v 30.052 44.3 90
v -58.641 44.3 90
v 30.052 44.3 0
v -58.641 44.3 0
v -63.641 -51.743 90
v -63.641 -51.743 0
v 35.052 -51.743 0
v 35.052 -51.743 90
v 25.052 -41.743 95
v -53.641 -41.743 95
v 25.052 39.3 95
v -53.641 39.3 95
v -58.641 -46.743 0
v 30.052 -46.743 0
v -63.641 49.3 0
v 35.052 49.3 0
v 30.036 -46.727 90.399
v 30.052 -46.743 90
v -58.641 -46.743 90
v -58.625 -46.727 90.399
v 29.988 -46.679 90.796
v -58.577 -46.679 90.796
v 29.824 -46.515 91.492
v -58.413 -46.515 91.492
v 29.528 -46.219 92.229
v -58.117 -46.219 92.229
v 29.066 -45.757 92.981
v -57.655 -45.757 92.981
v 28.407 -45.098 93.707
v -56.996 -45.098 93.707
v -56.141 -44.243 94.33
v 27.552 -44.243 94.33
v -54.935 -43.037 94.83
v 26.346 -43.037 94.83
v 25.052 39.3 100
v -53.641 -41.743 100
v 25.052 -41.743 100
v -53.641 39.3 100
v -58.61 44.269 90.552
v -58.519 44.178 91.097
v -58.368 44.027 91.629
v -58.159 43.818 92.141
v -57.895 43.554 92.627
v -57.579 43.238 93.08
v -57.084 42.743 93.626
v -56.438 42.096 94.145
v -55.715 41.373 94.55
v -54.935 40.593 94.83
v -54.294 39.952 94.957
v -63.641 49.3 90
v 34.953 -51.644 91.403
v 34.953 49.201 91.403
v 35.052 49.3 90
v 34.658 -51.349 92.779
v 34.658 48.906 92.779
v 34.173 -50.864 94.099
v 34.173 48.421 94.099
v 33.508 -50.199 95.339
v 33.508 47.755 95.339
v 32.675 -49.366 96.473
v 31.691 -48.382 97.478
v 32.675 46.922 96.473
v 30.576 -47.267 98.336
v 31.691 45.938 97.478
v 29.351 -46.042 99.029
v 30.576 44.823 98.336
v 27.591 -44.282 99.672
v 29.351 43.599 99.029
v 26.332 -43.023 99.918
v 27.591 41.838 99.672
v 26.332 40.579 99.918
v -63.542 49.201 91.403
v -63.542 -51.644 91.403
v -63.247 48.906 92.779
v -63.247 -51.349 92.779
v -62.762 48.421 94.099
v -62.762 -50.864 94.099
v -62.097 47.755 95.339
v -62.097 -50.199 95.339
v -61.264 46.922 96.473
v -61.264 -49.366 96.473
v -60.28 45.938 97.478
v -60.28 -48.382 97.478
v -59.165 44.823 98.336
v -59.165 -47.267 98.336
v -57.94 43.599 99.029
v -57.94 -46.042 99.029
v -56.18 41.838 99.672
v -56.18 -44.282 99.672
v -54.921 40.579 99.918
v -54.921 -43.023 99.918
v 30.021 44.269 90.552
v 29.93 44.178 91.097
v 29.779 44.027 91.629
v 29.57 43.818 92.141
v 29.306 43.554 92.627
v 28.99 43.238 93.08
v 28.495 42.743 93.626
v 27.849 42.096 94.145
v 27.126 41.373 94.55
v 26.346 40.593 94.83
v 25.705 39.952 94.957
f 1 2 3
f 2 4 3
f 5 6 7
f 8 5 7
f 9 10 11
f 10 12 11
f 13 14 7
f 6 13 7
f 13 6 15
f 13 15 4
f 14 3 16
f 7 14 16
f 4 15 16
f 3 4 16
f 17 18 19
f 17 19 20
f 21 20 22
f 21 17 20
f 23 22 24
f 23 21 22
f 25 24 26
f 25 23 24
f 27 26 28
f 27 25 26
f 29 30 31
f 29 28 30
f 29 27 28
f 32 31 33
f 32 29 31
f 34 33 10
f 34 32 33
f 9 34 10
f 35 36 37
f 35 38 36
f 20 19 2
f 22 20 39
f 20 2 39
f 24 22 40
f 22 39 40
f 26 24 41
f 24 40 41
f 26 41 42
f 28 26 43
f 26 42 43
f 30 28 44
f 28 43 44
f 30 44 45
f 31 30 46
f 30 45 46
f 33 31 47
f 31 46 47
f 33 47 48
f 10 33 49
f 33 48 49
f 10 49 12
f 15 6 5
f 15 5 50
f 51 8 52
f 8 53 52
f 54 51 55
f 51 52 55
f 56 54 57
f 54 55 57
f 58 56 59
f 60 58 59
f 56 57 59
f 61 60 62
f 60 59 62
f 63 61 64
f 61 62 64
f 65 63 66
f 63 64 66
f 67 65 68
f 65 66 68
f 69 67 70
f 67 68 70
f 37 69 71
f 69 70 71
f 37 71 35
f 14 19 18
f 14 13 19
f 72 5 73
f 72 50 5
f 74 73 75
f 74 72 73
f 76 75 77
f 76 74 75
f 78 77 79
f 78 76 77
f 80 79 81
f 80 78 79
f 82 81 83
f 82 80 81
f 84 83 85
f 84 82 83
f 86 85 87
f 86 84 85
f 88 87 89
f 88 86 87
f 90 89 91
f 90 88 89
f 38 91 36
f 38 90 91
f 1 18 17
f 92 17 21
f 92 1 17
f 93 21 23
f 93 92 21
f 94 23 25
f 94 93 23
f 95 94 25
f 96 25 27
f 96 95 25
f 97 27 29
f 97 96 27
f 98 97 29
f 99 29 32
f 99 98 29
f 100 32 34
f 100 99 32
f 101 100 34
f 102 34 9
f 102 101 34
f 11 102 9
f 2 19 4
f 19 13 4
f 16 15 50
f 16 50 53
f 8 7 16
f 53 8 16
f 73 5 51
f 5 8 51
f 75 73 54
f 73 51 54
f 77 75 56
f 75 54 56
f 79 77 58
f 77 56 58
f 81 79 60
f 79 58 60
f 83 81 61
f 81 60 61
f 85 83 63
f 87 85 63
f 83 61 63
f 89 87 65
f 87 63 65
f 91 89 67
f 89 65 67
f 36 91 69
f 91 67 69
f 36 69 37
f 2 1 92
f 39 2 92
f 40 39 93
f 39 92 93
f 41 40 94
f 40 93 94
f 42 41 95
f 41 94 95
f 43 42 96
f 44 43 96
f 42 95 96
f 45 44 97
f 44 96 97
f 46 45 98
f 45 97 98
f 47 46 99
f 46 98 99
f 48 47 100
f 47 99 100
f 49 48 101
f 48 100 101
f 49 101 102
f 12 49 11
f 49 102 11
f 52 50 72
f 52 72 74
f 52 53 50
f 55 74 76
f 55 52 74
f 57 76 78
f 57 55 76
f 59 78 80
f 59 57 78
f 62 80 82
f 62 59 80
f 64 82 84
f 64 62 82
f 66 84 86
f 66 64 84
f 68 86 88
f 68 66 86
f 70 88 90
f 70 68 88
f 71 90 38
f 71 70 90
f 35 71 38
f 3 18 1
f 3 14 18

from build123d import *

# Parameters (mm, degrees)
F0_W     = 98.692965
F0_H     = 101.042532
F1_DEPTH = 100
F2_R     = 10
F3_T     = -5


with BuildPart() as f1:
    # F0 (on Top) → F1 (new body)
    with BuildSketch(Plane.XY):
        with Locations((-14.294499, -1.221735)):
            Rectangle(F0_W, F0_H)
    extrude(amount=F1_DEPTH)

    # F2
    f2_edges = [f1.edges().sort_by_distance(p)[0] for p in [
        (-14.2945, -51.743001, 100),
        (35.051983, -1.221735, 100),
        (-14.2945, 49.299531, 100),
        (-63.640982, -1.221735, 100),
    ]]
    fillet(f2_edges, radius=F2_R)

    # F3
    f3_openings = [f1.faces().sort_by_distance(p)[0] for p in [
        (-14.2945, -1.221735, 0),
    ]]
    offset(amount=F3_T, openings=f3_openings)


solid = f1.part
